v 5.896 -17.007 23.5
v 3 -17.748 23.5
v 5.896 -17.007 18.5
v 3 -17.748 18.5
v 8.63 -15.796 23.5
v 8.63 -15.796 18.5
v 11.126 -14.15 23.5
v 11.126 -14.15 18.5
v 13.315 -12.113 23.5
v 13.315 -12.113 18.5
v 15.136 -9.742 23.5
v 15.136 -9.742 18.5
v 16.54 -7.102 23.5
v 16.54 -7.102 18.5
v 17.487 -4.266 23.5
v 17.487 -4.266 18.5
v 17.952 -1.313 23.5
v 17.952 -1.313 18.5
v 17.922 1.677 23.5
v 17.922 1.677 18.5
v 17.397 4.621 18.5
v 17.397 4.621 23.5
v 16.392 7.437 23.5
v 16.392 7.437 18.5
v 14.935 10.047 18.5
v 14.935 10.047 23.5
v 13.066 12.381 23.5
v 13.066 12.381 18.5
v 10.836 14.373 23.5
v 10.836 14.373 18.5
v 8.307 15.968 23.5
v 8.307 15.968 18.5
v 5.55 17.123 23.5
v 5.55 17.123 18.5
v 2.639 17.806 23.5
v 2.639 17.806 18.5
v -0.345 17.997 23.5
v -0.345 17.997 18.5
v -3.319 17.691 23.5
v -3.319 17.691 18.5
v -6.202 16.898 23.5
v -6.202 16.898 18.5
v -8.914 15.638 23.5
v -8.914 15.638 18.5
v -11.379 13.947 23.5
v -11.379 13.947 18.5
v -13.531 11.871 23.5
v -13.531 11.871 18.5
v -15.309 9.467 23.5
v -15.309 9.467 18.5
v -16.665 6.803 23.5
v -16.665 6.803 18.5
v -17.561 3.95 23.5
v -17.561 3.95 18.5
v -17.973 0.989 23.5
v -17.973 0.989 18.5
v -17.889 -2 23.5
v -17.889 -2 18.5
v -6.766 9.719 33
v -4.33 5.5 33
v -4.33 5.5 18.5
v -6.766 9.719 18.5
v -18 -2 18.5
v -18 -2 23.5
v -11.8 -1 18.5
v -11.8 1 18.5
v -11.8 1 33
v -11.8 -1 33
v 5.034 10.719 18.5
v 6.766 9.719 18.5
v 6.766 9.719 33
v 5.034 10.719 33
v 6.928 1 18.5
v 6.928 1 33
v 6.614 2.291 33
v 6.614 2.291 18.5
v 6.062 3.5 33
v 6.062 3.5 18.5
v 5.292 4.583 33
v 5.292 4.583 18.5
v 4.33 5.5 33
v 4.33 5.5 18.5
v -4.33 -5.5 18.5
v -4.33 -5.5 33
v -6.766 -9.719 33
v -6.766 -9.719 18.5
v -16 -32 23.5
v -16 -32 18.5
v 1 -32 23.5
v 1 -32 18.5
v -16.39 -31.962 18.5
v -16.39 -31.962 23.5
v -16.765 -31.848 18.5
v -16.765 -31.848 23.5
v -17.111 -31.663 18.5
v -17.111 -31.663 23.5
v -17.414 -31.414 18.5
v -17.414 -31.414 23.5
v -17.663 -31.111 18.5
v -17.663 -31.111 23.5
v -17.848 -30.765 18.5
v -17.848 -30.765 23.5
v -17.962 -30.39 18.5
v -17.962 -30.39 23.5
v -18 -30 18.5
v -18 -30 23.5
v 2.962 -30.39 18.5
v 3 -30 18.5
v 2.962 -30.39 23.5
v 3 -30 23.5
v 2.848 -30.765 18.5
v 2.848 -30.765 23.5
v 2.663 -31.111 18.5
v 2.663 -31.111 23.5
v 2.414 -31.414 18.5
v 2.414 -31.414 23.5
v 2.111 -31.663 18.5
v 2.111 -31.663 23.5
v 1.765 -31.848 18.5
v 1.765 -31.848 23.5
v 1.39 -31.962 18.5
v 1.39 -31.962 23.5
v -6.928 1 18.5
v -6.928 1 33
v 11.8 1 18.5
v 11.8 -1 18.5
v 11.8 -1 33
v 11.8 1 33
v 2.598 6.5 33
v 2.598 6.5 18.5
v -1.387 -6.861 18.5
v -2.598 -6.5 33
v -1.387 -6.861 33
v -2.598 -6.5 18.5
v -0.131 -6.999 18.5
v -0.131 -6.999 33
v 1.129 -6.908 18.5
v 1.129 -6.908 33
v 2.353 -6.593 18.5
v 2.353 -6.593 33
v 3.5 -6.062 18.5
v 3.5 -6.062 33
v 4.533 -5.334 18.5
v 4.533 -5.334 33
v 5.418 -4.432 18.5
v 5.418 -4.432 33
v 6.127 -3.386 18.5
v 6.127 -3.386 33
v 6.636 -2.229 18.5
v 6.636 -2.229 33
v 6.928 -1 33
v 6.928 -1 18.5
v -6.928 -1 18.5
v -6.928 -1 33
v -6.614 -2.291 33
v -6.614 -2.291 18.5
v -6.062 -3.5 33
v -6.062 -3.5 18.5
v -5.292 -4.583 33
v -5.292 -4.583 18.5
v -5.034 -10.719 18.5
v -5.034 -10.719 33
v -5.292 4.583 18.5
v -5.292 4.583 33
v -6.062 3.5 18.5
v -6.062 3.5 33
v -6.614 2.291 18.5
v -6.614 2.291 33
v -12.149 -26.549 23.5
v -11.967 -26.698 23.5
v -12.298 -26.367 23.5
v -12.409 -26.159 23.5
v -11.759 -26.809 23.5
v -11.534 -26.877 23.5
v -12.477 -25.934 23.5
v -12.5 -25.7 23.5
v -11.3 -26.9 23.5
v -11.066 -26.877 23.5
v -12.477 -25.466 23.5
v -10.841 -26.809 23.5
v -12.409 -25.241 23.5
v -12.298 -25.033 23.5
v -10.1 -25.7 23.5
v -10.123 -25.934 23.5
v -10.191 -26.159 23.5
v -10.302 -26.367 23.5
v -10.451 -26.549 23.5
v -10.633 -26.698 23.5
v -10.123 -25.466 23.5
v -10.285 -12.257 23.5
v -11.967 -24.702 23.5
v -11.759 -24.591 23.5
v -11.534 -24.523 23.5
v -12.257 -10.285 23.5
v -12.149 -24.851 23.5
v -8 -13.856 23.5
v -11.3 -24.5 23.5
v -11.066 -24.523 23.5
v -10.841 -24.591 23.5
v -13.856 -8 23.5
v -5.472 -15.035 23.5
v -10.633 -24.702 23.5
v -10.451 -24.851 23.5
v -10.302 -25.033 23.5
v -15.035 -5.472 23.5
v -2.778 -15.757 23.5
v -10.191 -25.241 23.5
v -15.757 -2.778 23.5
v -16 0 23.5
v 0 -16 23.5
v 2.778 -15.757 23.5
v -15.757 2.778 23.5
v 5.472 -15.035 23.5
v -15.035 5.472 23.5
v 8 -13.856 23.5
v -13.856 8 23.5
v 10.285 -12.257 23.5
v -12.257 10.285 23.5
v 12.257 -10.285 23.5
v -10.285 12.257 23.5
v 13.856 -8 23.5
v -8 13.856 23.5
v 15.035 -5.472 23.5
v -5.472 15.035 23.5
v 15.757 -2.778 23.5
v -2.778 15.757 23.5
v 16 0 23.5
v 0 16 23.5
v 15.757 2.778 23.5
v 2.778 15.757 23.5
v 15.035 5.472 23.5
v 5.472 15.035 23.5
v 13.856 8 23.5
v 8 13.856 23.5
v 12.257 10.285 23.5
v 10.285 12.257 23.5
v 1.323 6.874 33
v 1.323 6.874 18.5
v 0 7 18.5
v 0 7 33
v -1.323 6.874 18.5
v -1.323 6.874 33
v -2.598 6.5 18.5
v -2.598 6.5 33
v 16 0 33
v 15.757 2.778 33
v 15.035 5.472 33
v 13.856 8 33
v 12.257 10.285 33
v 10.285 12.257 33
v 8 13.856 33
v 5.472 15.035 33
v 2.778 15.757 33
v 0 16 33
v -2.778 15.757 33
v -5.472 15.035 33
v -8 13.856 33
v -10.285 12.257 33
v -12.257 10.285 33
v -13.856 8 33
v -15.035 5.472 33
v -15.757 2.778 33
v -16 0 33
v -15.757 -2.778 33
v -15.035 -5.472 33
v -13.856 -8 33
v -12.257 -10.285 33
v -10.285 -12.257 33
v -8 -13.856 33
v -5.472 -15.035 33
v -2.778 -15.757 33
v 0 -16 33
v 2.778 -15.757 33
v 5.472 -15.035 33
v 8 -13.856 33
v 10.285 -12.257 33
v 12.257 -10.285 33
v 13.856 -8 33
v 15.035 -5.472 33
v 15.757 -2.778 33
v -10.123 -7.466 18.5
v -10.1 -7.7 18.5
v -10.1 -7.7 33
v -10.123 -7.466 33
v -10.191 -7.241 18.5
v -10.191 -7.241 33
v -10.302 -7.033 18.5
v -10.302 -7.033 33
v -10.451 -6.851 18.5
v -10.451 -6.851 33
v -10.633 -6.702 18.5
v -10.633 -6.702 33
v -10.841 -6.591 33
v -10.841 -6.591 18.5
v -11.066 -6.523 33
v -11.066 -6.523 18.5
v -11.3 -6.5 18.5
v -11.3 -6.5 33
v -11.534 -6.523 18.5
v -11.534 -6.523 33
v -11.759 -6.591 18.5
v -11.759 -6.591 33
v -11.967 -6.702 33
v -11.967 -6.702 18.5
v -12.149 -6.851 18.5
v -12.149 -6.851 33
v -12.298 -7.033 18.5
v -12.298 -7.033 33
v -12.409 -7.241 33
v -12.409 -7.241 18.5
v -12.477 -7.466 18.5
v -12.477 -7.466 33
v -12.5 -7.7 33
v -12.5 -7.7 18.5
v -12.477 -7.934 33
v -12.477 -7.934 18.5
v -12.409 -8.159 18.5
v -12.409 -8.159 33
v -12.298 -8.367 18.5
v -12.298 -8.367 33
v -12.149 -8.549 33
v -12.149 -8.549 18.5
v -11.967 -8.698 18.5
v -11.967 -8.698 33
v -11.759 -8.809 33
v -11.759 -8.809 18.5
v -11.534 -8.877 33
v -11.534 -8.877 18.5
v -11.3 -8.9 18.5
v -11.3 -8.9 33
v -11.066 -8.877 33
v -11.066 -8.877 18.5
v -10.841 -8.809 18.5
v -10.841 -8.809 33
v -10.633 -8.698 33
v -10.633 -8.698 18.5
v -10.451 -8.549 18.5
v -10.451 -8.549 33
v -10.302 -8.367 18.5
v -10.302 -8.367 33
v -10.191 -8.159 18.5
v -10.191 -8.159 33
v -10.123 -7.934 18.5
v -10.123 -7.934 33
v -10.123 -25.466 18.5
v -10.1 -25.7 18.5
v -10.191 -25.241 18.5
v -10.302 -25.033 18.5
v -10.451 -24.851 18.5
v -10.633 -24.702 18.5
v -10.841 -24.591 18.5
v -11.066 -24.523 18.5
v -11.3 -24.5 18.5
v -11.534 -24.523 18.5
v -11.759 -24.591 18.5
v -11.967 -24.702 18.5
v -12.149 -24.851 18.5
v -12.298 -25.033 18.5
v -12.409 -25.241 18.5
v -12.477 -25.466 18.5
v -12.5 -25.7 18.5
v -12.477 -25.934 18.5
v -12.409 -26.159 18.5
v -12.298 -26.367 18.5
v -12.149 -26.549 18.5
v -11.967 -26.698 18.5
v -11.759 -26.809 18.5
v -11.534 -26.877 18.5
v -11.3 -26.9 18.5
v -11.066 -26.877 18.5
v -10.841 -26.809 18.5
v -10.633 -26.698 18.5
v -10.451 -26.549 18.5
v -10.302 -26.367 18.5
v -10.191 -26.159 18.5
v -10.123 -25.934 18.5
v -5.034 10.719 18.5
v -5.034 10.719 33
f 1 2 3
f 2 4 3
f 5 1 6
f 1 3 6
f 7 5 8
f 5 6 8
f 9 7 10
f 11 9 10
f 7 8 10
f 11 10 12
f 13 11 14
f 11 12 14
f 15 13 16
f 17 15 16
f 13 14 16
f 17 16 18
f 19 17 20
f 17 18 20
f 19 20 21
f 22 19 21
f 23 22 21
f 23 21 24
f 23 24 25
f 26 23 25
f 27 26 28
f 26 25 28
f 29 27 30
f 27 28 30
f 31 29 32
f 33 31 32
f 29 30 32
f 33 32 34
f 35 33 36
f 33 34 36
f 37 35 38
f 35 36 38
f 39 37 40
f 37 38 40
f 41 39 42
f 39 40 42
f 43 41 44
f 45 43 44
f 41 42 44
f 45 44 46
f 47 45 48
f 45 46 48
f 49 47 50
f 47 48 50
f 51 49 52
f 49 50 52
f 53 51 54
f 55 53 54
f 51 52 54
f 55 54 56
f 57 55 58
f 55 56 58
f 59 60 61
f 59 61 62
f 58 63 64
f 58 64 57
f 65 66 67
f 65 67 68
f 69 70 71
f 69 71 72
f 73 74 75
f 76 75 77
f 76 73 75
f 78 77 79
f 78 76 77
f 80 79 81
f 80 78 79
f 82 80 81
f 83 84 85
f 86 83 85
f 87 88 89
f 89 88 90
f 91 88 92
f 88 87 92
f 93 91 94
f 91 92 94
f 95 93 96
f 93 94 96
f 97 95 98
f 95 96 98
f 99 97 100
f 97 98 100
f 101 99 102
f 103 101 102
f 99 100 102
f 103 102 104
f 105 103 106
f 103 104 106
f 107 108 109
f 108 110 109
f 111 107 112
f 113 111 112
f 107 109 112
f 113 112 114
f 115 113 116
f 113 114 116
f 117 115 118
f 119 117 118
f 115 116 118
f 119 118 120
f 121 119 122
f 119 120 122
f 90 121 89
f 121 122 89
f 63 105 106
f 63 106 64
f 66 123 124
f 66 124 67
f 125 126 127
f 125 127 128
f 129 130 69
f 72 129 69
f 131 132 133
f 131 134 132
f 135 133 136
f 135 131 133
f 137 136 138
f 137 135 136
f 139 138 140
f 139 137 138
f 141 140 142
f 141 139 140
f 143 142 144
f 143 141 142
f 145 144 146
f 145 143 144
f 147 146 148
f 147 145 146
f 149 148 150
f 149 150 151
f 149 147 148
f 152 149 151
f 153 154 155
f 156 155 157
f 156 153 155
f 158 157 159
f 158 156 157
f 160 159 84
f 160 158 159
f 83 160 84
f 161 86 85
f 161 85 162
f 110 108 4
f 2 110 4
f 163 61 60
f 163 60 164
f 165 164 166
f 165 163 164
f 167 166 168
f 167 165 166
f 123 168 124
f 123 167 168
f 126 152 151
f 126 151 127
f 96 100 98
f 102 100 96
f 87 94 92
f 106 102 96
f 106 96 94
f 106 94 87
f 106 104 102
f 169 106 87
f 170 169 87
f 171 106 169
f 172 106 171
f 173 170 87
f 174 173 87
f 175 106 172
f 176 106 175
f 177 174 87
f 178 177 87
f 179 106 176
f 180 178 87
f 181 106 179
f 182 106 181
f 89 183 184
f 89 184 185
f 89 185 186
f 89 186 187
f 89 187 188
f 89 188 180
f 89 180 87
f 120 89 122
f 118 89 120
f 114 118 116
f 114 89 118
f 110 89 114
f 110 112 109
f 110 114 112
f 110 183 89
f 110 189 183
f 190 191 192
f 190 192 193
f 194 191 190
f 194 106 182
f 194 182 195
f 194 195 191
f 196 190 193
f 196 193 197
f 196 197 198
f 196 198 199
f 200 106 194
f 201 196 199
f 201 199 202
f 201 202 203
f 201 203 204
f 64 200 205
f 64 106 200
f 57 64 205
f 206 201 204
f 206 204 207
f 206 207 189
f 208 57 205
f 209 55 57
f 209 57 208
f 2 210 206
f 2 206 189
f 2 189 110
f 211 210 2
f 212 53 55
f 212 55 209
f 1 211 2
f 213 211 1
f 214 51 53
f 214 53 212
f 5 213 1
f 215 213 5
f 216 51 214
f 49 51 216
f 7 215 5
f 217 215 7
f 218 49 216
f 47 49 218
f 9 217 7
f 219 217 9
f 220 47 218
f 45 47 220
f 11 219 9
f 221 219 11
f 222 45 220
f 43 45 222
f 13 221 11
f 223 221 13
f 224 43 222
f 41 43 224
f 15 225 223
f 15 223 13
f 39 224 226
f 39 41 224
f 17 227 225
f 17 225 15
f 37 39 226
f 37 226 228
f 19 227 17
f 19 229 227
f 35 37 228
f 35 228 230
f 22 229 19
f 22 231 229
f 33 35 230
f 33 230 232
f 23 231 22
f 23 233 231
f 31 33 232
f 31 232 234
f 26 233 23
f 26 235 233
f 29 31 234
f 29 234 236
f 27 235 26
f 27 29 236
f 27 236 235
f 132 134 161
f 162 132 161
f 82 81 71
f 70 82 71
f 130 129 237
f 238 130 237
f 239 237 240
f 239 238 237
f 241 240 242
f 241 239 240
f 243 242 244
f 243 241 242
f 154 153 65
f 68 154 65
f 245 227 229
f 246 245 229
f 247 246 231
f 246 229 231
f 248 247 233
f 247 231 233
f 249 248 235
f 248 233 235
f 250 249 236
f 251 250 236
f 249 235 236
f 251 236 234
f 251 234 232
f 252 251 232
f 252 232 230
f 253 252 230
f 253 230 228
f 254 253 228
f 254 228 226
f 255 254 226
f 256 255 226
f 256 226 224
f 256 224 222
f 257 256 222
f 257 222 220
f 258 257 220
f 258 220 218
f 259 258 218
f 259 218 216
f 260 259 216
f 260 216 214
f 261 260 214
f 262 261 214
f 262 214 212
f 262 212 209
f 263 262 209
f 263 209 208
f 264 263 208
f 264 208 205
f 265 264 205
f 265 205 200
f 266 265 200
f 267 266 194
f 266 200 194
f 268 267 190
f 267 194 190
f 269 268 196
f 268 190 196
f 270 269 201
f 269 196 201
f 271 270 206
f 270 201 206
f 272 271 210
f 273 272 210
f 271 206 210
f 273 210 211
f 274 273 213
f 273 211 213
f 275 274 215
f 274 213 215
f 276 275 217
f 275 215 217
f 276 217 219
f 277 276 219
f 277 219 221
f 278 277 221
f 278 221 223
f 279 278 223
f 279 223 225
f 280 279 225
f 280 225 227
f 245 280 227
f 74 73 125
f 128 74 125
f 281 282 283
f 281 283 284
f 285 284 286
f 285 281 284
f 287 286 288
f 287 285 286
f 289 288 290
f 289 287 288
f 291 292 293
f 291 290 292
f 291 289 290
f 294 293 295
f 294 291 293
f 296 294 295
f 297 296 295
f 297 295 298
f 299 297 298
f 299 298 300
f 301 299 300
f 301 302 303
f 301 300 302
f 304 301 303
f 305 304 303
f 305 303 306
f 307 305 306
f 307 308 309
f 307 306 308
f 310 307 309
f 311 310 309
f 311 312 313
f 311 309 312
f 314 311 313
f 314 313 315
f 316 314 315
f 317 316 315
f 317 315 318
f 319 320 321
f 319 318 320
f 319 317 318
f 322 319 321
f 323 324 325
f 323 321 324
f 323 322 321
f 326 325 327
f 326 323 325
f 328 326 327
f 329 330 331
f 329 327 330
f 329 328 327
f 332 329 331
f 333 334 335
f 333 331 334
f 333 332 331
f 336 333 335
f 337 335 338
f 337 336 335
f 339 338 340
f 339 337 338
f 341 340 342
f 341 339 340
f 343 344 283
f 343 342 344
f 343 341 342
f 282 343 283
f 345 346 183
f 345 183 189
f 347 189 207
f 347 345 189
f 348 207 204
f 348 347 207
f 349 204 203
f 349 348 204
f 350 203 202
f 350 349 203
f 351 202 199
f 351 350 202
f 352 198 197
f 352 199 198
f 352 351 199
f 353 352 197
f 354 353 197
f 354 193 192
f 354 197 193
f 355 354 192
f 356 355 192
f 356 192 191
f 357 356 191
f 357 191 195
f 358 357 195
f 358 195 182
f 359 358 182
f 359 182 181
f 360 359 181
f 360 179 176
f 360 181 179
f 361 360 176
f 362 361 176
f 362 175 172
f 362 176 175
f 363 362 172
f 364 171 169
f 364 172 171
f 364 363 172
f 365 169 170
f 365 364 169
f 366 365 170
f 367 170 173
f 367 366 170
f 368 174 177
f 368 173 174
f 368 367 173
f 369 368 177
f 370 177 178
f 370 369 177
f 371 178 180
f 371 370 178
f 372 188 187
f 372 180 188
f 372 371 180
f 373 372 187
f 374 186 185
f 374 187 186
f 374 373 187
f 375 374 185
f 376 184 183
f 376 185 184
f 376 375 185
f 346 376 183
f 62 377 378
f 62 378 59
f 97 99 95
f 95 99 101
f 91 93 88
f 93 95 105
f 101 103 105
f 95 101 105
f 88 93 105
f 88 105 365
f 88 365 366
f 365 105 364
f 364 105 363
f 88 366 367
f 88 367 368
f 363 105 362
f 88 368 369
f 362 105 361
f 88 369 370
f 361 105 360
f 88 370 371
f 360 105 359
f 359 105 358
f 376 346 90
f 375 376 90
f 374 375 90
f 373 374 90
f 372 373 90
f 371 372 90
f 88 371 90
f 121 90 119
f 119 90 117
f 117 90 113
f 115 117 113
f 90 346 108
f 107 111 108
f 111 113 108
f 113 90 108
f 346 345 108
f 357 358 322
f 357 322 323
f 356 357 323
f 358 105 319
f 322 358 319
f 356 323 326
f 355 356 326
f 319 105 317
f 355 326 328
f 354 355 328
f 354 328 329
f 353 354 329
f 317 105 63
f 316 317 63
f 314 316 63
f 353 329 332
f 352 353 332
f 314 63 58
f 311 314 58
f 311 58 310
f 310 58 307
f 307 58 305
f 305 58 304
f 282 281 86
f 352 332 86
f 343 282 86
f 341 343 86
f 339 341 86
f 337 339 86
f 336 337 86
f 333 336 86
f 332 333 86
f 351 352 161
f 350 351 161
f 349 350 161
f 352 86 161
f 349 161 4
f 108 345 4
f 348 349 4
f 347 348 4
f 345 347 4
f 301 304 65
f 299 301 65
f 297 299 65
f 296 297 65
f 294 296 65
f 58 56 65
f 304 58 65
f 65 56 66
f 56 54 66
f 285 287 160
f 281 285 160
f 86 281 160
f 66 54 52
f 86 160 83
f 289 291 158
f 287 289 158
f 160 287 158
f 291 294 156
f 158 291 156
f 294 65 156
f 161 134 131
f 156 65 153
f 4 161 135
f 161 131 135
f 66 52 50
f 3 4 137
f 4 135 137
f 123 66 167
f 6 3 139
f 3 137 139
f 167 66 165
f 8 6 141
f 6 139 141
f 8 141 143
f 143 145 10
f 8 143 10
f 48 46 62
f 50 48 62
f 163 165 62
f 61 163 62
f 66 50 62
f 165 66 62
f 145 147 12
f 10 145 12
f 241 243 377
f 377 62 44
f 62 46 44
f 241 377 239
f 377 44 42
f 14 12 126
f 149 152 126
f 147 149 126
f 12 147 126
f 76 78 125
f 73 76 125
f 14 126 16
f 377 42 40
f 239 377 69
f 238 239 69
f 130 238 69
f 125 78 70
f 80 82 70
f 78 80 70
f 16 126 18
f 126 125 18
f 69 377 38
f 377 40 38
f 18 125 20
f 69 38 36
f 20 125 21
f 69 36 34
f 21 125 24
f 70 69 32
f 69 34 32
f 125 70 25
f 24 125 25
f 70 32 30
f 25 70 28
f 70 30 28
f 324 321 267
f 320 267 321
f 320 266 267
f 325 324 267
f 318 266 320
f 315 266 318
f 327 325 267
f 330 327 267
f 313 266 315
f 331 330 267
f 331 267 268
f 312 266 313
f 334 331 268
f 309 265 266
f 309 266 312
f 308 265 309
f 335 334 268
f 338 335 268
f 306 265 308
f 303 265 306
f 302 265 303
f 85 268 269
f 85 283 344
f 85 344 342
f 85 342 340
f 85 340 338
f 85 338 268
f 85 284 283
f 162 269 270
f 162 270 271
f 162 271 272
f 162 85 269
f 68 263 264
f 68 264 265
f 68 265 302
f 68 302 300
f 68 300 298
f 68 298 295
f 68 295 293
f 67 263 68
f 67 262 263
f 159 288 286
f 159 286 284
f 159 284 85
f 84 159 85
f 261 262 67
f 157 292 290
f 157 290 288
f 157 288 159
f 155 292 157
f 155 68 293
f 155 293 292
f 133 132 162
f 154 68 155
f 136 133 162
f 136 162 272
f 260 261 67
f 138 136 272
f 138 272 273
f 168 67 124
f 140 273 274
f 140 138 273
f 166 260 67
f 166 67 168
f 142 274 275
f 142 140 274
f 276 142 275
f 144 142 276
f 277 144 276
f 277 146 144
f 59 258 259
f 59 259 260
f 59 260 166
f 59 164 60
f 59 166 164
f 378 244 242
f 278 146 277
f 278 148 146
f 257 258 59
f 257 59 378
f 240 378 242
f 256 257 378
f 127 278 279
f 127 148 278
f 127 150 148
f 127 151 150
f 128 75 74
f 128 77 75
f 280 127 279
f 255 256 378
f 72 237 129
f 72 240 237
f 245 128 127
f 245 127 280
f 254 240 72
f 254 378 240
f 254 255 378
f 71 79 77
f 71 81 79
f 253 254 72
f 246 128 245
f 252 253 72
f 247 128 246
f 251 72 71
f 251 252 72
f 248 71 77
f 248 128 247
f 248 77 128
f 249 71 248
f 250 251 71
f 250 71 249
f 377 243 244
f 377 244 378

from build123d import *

# Parameters (mm, degrees)
CYLINDER004_R     = 7
CYLINDER004_DEPTH = 20
BOX001_W          = 5
BOX001_H          = 2
BOX001_DEPTH      = 20
ARRAY006_COUNT    = 5
ARRAY006_ANGLE    = 240
CYLINDER014_R     = 1.2
CYLINDER014_DEPTH = 10
CYLINDER013_R     = 1.2
CYLINDER013_DEPTH = 20
CYLINDER006_R     = 16
CYLINDER006_DEPTH = 10
CYLINDER005_R     = 18
CYLINDER005_DEPTH = 5
BOX017_W          = 21
BOX017_H          = 30
BOX017_DEPTH      = 5
FILLET_R          = 2


with BuildPart() as cilindro004:
    # Cylinder004 → Cylinder004 (new body)
    with BuildSketch(Plane.XY):
        Circle(CYLINDER004_R)
    extrude(amount=CYLINDER004_DEPTH)


with BuildPart() as axle_model:
    # Box001 → Box001 (new body)
    with BuildSketch(Plane(origin=(6.8, -1, 0), x_dir=(1, 0, 0), z_dir=(0, 0, 1))):
        with Locations((2.5, 1)):
            Rectangle(BOX001_W, BOX001_H)
    extrude(amount=BOX001_DEPTH)

    # Array006: Axle_Model ×5 about axis
    array006_axis = Axis((0, 0, 0), (0, 0, 1))


with BuildPart() as axle_model_1:
    add(axle_model.part)
    for i in range(1, ARRAY006_COUNT):
        add(axle_model.part.rotate(array006_axis, i * ARRAY006_ANGLE / (ARRAY006_COUNT - 1)))

    # Fusion009: union Cilindro004
    add(cilindro004.part)


with BuildPart() as axle_model_2:
    # Fusion009 placement: moved
    add(axle_model_1.part.moved(Location((0, 0, 13))))


with BuildPart() as cilindro013:
    # Cylinder014 → Cylinder014 (new body)
    with BuildSketch(Plane(origin=(-11.3, -25.7, 14), x_dir=(1, 0, 0), z_dir=(0, 0, 1))):
        Circle(CYLINDER014_R)
    extrude(amount=CYLINDER014_DEPTH)


with BuildPart() as cilindro012:
    # Cylinder013 → Cylinder013 (new body)
    with BuildSketch(Plane(origin=(-11.3, -7.7, 14), x_dir=(1, 0, 0), z_dir=(0, 0, 1))):
        Circle(CYLINDER013_R)
    extrude(amount=CYLINDER013_DEPTH)


with BuildPart() as cilindro006:
    # Cylinder006 → Cylinder006 (new body)
    with BuildSketch(Plane.XY.offset(18)):
        Circle(CYLINDER006_R)
    extrude(amount=CYLINDER006_DEPTH)


with BuildPart() as fusion015:
    # Cylinder005 → Cylinder005 (new body)
    with BuildSketch(Plane.XY.offset(13.5)):
        Circle(CYLINDER005_R)
    extrude(amount=CYLINDER005_DEPTH)

    # Fusion015: union Cilindro006
    add(cilindro006.part)


with BuildPart() as sensorsupport:
    # Box017 → Box017 (new body)
    with BuildSketch(Plane(origin=(-18, -32, 13.5), x_dir=(1, 0, 0), z_dir=(0, 0, 1))):
        with Locations((10.5, 15)):
            Rectangle(BOX017_W, BOX017_H)
    extrude(amount=BOX017_DEPTH)

    # Fusion016: union Fusion015
    add(fusion015.part)


with BuildPart() as sensorsupport_1:
    # Fusion016 placement: moved
    add(sensorsupport.part.moved(Location((0, 0, 5))))

    # Cut015: cut Cilindro012
    add(cilindro012.part, mode=Mode.SUBTRACT)

    # Cut016: cut Cilindro013
    add(cilindro013.part, mode=Mode.SUBTRACT)

    # Cut: cut Axle_Model
    add(axle_model_2.part, mode=Mode.SUBTRACT)

    # Fillet
    fillet_edges = [sensorsupport_1.edges().sort_by_distance(p)[0] for p in [
        (-18, -32, 21),
        (3, -32, 21),
    ]]
    fillet(fillet_edges, radius=FILLET_R)


solid = sensorsupport_1.part
